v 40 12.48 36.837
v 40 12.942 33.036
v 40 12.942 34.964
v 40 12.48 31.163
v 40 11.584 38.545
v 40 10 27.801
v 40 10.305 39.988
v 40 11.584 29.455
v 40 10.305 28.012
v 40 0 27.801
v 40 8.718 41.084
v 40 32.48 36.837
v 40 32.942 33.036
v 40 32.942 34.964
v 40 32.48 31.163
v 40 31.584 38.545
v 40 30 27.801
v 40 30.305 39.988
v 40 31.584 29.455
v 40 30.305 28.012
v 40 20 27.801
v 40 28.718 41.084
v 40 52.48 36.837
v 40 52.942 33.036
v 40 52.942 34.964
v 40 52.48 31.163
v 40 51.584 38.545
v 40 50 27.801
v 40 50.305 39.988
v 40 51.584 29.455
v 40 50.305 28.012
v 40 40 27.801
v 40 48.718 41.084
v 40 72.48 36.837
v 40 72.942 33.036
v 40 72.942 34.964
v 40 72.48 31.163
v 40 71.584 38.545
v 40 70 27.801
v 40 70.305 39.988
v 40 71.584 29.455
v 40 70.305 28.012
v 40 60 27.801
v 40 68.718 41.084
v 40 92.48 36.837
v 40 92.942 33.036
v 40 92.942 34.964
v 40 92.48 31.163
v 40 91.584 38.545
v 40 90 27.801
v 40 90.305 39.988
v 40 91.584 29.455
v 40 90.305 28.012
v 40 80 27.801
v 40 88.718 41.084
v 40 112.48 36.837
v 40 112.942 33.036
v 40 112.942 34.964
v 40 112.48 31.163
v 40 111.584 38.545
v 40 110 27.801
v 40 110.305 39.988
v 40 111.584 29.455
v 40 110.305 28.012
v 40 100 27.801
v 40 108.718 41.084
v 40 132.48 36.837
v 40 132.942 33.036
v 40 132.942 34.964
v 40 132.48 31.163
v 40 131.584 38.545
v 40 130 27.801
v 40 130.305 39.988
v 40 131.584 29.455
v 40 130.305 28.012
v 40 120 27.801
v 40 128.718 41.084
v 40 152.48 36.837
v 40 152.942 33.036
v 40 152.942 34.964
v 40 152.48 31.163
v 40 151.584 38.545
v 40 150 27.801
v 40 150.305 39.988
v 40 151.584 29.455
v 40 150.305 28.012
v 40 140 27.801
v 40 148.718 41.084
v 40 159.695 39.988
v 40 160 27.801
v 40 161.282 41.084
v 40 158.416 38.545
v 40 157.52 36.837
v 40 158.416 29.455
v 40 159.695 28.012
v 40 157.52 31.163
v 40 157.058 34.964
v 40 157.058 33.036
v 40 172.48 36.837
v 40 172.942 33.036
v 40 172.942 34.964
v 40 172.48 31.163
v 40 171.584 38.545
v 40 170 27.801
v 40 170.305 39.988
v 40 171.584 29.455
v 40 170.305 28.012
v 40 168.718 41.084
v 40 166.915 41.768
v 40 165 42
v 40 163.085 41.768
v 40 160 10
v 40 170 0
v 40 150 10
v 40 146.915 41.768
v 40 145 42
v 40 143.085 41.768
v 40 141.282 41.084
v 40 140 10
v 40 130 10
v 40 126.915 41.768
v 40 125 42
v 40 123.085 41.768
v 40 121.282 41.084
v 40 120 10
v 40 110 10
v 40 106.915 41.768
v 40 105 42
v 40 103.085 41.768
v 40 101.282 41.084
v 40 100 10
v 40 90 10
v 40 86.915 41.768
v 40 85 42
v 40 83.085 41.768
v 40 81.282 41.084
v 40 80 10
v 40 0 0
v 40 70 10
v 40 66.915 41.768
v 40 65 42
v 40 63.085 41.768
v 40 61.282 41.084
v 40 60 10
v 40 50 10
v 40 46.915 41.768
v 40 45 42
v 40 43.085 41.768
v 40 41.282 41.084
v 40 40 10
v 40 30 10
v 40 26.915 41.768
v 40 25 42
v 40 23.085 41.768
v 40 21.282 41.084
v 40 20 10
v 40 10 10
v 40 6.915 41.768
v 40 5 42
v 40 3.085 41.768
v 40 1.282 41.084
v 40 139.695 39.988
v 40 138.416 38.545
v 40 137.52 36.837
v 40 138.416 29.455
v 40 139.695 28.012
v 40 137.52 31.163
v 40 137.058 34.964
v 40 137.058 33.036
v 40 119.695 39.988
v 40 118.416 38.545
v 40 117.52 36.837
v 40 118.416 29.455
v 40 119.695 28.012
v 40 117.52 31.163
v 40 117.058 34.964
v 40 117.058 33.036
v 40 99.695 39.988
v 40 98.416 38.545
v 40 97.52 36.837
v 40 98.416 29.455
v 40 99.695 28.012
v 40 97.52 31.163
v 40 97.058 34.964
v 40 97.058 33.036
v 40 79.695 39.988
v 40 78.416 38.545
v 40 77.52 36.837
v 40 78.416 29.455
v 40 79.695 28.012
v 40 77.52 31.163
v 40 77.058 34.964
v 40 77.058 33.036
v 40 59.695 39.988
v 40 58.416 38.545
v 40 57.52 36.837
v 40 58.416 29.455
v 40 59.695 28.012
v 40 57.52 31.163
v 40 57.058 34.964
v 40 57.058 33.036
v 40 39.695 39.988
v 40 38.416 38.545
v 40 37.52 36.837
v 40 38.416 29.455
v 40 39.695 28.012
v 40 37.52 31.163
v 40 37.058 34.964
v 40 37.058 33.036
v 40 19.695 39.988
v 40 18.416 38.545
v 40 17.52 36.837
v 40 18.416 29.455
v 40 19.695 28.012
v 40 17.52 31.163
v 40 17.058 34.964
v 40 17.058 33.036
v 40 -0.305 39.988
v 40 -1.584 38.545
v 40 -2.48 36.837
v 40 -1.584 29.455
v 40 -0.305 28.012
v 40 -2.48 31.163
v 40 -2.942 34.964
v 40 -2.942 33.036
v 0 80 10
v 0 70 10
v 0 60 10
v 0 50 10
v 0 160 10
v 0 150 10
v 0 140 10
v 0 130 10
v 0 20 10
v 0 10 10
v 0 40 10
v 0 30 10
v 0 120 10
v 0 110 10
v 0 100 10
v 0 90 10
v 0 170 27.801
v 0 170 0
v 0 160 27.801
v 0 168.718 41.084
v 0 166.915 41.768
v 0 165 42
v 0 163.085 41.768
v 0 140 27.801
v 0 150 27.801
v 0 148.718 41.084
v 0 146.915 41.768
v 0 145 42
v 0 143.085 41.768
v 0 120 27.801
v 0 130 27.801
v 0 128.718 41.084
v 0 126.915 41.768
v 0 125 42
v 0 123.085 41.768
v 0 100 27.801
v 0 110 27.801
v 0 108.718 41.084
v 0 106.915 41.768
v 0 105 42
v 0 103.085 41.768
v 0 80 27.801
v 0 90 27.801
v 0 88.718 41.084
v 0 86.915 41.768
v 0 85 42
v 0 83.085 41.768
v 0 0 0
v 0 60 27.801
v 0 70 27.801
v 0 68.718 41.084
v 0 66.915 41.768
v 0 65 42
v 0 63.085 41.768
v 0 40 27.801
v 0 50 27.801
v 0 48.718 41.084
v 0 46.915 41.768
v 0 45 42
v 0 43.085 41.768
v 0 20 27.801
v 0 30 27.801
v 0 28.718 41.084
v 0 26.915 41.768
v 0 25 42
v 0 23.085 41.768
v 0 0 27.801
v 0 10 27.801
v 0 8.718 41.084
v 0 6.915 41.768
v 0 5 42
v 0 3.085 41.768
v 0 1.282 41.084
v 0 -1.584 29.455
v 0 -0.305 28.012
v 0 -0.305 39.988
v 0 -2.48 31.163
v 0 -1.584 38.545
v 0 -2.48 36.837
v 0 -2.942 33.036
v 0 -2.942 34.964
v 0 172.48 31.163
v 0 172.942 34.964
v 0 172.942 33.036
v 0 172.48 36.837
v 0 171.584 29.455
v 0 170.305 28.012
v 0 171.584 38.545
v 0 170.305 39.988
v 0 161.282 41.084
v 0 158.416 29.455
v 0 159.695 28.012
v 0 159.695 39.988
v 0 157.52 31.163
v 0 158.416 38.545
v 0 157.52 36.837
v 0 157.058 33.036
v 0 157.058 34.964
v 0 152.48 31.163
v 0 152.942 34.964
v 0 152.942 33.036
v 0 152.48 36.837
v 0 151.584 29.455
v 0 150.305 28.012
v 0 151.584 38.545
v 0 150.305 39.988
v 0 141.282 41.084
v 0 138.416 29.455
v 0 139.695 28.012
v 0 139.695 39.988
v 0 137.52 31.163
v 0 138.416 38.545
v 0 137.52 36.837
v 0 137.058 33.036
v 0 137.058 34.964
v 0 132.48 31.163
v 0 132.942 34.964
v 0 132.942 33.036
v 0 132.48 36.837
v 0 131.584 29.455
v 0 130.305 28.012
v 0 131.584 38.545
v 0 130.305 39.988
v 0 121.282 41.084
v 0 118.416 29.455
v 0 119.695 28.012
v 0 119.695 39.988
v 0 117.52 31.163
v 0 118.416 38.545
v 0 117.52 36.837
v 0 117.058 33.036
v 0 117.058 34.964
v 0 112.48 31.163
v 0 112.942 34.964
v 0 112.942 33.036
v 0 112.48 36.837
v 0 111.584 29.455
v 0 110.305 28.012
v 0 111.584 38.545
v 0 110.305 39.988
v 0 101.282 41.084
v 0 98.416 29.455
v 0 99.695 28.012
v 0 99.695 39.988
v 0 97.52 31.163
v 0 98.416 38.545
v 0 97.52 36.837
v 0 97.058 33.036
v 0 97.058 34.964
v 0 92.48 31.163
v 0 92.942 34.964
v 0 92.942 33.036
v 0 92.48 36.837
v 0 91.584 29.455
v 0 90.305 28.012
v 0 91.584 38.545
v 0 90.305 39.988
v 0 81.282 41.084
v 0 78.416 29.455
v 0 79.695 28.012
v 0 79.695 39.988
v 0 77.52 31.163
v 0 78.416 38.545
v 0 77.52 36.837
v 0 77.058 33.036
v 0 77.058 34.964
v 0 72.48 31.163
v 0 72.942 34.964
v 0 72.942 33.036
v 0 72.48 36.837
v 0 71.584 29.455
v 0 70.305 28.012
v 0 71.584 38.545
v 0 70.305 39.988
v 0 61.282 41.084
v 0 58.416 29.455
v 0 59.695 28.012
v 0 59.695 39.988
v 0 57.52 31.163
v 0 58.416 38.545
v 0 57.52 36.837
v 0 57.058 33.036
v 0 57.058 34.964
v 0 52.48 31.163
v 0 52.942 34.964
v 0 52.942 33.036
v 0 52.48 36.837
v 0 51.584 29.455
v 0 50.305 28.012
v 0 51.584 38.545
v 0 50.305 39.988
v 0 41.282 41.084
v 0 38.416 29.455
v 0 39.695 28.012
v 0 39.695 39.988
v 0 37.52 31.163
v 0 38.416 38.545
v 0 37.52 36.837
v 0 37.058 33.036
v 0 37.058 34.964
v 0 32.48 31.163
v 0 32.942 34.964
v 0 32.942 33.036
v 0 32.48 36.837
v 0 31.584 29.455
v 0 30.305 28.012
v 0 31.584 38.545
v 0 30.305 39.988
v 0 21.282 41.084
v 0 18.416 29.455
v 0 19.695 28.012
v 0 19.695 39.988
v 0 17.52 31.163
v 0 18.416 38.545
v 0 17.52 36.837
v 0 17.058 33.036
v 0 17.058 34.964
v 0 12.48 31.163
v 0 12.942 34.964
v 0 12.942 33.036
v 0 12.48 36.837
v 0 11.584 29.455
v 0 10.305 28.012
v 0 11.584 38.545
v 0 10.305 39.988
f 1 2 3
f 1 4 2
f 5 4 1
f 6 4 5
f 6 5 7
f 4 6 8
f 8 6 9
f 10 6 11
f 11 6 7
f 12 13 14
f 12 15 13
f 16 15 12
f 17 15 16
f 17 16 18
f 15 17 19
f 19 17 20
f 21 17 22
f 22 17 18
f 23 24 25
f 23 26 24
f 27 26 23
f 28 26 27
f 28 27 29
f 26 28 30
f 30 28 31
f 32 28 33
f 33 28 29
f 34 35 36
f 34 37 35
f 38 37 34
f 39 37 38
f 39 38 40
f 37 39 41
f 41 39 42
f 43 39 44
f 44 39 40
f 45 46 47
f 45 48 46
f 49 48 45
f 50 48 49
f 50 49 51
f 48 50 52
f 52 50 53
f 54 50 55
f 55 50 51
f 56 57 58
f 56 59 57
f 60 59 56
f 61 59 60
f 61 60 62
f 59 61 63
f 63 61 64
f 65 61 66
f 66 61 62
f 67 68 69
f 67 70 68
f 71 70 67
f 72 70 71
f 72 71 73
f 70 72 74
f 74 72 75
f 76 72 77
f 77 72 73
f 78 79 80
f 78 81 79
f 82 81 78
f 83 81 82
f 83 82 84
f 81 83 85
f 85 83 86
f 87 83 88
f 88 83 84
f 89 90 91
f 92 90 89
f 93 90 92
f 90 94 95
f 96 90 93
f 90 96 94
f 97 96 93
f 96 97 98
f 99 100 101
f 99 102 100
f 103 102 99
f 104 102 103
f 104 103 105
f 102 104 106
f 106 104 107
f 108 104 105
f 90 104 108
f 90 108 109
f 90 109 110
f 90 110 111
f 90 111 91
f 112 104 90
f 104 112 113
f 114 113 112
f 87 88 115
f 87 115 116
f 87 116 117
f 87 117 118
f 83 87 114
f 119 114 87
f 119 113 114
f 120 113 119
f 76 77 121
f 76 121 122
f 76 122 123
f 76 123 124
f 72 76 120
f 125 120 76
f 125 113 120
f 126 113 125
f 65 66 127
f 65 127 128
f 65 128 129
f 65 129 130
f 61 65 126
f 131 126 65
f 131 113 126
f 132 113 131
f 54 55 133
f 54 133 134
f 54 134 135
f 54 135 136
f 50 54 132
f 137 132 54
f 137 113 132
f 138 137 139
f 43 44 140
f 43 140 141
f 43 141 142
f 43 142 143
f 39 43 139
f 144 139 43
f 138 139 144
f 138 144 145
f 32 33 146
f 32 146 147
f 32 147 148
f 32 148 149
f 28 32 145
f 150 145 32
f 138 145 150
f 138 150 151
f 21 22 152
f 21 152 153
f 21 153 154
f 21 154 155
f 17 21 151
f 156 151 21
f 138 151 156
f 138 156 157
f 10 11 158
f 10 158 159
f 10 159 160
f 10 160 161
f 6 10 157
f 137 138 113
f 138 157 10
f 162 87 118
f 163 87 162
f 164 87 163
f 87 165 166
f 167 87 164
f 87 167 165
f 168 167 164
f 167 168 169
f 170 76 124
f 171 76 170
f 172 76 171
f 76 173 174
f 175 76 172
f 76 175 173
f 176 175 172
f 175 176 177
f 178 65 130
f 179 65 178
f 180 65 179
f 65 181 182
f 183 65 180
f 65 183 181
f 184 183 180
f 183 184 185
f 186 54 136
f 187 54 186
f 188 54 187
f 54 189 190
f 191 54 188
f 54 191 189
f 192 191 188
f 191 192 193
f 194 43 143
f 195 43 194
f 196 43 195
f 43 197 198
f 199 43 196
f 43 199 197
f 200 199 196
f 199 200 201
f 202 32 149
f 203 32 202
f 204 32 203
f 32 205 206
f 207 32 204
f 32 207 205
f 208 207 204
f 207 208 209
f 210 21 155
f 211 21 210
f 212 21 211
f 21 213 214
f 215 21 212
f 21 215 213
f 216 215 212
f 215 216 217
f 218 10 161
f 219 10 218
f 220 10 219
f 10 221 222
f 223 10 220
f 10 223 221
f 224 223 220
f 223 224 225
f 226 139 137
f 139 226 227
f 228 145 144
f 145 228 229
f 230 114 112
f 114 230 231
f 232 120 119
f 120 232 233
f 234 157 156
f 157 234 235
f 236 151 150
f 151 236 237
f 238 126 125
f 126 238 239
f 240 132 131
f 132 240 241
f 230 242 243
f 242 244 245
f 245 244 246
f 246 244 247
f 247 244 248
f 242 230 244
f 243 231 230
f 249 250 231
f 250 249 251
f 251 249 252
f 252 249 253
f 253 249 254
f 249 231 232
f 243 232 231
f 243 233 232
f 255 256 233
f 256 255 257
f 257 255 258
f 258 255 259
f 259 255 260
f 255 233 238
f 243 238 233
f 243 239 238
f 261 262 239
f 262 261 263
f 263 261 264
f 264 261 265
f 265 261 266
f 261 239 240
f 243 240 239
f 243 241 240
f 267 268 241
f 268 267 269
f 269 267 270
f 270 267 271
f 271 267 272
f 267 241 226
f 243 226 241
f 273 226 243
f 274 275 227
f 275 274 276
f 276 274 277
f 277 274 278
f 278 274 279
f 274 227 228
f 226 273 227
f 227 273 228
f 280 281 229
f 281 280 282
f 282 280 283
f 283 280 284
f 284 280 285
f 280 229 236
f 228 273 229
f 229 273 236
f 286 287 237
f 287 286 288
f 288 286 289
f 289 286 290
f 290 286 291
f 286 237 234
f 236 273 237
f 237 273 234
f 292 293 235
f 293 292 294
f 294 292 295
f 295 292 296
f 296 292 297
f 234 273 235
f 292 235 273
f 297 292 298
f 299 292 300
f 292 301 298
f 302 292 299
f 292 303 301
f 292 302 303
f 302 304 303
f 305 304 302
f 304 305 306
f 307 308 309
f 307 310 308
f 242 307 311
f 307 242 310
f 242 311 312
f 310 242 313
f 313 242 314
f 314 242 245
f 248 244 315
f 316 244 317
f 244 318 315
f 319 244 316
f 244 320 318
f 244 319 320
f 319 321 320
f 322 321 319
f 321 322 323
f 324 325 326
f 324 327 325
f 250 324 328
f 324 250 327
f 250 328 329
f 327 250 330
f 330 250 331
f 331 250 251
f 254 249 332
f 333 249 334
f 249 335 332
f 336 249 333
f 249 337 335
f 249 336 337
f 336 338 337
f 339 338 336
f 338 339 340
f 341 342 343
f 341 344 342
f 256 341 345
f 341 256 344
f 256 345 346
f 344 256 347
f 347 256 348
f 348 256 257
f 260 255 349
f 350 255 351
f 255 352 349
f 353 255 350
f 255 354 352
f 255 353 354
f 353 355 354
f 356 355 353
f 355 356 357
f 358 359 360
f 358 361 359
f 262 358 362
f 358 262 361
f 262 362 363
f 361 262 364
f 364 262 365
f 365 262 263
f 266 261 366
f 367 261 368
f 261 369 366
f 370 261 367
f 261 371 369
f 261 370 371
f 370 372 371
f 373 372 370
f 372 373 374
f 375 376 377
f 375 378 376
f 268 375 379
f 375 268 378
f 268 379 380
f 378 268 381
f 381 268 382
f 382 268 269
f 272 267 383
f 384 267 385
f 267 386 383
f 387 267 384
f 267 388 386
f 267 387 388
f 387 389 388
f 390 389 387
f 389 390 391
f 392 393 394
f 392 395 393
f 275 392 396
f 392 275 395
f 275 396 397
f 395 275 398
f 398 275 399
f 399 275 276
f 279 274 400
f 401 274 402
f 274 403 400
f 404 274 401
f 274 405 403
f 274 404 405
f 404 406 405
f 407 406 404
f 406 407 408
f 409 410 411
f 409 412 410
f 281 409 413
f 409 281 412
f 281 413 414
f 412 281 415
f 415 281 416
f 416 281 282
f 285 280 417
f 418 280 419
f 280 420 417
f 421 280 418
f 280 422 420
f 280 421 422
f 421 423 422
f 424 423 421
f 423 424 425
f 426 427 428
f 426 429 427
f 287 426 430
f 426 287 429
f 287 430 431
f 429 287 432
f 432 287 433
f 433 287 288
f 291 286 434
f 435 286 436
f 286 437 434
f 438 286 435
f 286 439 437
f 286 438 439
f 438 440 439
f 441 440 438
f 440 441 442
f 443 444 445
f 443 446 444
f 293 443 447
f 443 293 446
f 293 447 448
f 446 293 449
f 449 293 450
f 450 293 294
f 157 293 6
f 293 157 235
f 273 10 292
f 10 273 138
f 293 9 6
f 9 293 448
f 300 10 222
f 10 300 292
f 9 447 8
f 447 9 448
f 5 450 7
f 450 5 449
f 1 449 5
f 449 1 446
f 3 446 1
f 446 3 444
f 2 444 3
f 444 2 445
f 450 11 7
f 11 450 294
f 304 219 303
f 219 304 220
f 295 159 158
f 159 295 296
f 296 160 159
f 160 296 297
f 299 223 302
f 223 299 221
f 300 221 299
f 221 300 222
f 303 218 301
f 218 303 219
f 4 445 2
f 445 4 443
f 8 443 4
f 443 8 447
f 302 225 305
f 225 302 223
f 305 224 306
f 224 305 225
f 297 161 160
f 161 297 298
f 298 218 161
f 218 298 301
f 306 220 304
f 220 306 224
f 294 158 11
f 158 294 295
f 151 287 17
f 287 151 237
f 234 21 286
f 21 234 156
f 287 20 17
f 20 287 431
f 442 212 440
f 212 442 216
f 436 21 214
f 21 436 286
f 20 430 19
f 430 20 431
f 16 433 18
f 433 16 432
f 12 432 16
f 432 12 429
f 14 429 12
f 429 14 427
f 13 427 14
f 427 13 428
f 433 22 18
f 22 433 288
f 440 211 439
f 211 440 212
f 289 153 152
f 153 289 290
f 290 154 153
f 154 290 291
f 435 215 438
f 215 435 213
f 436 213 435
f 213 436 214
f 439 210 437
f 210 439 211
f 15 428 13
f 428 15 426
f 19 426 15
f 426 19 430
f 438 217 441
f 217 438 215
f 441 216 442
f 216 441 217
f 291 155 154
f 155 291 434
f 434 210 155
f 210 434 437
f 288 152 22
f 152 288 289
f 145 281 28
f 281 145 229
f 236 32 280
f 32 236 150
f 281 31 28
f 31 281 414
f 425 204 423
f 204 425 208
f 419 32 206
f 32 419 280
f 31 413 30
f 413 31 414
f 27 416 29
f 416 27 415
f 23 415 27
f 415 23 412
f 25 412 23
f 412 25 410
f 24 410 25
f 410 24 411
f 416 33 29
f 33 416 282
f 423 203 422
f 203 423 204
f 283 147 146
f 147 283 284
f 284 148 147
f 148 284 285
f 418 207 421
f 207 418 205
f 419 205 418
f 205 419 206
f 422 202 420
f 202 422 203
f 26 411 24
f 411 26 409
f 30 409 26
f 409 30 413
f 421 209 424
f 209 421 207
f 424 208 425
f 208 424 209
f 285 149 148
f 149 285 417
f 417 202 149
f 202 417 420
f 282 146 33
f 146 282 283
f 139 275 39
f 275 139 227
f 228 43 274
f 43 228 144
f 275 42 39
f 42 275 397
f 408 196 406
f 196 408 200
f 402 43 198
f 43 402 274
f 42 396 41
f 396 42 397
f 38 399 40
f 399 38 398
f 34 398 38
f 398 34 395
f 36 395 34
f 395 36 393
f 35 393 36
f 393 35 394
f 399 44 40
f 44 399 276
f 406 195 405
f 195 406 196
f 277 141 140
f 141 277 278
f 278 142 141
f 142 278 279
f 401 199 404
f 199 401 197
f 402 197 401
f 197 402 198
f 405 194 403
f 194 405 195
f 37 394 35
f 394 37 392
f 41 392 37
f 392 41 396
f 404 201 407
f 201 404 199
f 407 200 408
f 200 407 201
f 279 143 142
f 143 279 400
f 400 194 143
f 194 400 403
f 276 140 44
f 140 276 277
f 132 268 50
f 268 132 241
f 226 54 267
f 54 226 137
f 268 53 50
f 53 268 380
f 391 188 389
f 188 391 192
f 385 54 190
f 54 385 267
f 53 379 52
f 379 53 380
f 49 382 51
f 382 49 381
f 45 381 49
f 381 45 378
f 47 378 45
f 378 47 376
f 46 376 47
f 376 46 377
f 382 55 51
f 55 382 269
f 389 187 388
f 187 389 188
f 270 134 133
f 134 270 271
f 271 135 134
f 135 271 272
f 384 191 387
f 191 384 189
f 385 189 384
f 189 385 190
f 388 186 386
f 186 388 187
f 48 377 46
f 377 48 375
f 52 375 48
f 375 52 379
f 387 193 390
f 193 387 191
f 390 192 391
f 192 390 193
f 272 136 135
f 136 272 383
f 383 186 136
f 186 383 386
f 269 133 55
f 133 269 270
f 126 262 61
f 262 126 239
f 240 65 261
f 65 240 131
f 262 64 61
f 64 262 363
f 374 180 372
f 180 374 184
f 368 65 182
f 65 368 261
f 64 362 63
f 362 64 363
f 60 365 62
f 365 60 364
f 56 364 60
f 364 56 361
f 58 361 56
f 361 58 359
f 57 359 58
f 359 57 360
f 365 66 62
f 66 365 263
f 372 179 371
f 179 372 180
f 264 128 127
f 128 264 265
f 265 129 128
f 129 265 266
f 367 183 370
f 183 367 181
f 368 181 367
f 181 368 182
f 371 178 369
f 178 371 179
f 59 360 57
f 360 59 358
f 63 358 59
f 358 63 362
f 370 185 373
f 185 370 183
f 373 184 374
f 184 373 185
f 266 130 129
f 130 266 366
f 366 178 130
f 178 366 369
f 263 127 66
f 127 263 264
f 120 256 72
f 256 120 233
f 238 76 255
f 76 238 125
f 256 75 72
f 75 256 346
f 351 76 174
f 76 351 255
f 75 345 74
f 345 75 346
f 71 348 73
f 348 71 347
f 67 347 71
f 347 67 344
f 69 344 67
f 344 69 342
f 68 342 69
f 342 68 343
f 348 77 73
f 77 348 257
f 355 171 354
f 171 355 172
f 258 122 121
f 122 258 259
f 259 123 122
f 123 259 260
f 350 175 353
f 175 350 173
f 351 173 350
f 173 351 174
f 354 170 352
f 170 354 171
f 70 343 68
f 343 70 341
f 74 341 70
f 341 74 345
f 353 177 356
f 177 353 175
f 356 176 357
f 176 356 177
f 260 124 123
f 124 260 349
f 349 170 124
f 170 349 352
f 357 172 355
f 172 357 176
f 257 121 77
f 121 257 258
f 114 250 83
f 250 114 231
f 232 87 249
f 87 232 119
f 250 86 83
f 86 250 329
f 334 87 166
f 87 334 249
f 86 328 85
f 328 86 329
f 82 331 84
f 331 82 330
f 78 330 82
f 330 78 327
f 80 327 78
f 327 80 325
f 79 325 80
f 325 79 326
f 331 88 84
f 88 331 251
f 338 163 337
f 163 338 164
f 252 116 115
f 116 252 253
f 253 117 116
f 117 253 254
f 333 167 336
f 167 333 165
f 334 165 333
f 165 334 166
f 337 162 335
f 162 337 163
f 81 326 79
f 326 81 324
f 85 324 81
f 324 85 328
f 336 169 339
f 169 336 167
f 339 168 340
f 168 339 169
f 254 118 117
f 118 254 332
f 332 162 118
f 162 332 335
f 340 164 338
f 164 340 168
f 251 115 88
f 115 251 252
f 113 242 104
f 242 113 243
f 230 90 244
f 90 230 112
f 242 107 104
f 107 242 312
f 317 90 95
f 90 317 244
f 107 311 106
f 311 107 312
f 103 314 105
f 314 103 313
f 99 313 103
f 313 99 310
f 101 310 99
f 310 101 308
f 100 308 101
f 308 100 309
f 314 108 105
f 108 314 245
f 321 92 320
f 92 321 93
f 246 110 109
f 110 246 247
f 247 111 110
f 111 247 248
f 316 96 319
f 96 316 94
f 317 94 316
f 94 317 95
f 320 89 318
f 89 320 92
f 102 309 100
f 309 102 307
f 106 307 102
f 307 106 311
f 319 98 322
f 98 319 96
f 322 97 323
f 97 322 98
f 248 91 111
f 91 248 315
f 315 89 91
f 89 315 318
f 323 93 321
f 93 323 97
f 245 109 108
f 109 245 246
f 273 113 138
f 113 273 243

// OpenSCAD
// Radius of Circle
circleRadius = 8; // [1:0.25:15]

// Width of Post
postWidth = 10; // [0.5:0.5:10]

// Height of Post Before Circle
postHeightBeforeCircle = 16; // [0:0.5:20]

// Width of Base
baseWidth = 10; // [1:0.25:10]

// Width of Gap Between Posts
gap = 10; // [1:0.5:15]

// Number of Posts
numPosts = 9; // [1:1:20]

// Depth of Holder
depth = 40; // [1:1:50]

// Calculated Variables
postHeight = postHeightBeforeCircle + circleRadius;
totalLength = (numPosts * postWidth) + (gap * (numPosts - 1));

// Model Generation
module example() {
	cube ([depth,totalLength,baseWidth]);
	
	for (i = [0 : postWidth + gap : totalLength]){
		translate([0, i, baseWidth]){
			cube([depth, postWidth, postHeight]);
		}
		translate([0, (i+postWidth/2), postHeight+baseWidth]){
			rotate([0, 90, 0]){
				cylinder(h=depth, r=circleRadius);
			}
		}
	}
			
}

example();
